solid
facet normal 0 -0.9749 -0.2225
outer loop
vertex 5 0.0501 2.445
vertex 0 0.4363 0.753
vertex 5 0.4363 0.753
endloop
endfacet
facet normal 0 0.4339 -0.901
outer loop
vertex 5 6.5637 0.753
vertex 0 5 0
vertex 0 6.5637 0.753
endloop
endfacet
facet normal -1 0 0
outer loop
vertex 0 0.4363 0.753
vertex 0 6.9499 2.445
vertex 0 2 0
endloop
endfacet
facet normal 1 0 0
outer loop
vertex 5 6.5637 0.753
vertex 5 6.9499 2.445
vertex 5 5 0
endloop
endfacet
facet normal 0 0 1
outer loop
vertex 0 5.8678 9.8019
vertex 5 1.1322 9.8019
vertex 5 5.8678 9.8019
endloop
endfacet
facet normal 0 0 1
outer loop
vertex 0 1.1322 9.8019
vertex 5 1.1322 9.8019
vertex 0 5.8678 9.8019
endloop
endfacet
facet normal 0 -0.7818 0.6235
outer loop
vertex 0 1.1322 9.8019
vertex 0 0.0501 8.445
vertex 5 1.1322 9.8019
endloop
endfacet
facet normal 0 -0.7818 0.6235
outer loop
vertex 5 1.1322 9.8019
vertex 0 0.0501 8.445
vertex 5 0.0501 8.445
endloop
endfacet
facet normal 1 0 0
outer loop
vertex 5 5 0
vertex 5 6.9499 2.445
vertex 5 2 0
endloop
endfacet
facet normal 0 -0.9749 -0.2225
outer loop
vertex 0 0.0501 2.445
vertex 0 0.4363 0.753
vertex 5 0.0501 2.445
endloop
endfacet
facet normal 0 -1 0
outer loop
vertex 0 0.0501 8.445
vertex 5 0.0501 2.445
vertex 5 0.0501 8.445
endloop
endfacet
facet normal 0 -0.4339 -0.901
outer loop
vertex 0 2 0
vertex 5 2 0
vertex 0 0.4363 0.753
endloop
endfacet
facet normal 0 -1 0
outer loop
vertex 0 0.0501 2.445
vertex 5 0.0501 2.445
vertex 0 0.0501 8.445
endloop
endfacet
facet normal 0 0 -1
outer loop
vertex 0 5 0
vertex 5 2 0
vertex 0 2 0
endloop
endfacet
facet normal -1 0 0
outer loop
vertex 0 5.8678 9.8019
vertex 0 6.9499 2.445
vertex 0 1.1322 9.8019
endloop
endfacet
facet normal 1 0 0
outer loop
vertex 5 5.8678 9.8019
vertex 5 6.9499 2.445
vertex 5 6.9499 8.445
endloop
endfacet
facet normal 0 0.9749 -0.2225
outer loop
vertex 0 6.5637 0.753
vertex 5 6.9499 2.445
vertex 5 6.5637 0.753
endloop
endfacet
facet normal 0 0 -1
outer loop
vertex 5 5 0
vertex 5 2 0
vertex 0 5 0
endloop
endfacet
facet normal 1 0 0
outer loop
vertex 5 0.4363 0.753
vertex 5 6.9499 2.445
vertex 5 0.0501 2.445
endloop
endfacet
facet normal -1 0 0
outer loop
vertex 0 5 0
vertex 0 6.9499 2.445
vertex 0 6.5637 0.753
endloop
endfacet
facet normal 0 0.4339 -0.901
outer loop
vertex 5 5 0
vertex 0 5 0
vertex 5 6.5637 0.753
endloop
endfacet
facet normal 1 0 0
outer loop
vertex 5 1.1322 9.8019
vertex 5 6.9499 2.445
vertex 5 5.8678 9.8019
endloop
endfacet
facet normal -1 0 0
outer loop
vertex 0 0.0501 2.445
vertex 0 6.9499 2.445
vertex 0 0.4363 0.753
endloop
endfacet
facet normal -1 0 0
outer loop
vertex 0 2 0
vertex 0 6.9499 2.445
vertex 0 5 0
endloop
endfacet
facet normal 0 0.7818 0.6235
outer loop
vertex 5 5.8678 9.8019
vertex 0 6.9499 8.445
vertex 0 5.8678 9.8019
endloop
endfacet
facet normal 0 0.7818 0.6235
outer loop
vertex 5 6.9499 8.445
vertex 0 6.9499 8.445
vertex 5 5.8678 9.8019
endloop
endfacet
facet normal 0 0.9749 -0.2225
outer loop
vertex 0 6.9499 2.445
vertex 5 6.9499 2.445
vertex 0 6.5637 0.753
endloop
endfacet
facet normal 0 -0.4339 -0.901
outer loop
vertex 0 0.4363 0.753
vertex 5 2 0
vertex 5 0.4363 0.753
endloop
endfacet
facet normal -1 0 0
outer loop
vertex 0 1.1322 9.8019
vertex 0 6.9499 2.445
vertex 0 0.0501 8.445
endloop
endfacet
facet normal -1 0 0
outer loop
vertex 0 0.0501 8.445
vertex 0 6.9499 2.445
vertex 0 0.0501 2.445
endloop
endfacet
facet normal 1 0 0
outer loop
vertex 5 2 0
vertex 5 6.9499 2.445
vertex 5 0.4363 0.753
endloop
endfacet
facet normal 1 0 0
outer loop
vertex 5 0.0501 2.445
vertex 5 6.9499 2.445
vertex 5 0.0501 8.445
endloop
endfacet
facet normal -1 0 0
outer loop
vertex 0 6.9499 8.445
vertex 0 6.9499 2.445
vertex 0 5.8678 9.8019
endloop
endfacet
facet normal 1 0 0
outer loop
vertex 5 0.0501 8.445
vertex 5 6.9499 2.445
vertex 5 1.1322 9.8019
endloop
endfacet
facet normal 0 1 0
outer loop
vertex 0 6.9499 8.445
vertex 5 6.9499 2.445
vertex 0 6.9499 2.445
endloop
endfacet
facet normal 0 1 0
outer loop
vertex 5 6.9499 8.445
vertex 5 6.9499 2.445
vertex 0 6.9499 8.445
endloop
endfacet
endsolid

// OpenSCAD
module cube2(size, center = false, center_xy = false, center_x = false, center_y = false, center_z = false) {
  translate([(center || center_x || center_xy ? -size[0]/2 : 0), (center || center_y || center_xy ? -size[1]/2 : 0), (center || center_z ? -size[2]/2 : 0)]) cube(size);
}
/*!cube2([5, 7, 10]);*/
/*!cube2([5, 7, 10], center_x = true, center_y = false, center_z = true);*/
/*!cube2([5, 7, 10], center = true);*/

module cube_rounded_corners(size, corner_radius, center = false, center_xy = false, center_x = false, center_y = false, center_z = false) {
  base_size = [ for (c = size) c - 2 * corner_radius ];
  /*for (c = base_size) assert(c > 0); // XXX need 2017 openscad*/ 
  translate([(center || center_x || center_xy ? -size[0]/2 : 0) + corner_radius, (center || center_y || center_xy ? -size[1]/2 : 0) + corner_radius, (center || center_z ? -size[2]/2 : 0) + corner_radius]) minkowski() {
    cube(base_size);
    sphere(r=corner_radius);
  }
}
/*!cube_rounded_corners([5, 7, 10], corner_radius = 2, center_x = true, center_y = false, center_z = true);*/
/*!cube_rounded_corners([5, 7, 10], corner_radius = 2, center = true);*/

module cube_rounded_top_corners(size, corner_radius, center = false, center_xy = false, center_x = false, center_y = false, center_z = false) {
    intersection() {
        translate([0, 0, -corner_radius]) cube_rounded_corners([size[0], size[1], size[2] + corner_radius], corner_radius, center, center_xy, center_x, center_y, center_z);
        cube2(size, center, center_xy, center_x, center_y, center_z);
    }
}

module cube_rounded_vertical_edges(size, corner_radius, center_xy = false, center = false, center_x = false, center_y = false, center_z = false) {
  base_size = [ size[0] - 2 * corner_radius, size[1] - 2 * corner_radius, size[2] - 0.1 ];
  /*for (c = base_size) assert(c > 0); // XXX need 2017 openscad*/ 
  translate([(center || center_x || center_xy ? -size[0]/2 : 0) + corner_radius, (center || center_y || center_xy ? -size[1]/2 : 0) + corner_radius, (center || center_z ? -size[2]/2 : 0)]) minkowski() {
    cube(base_size);
    cylinder(r=corner_radius, h=0.1);
  }
}
module cube_rounded_z_edges(size, corner_radius, center_xy = false, center = false, center_x = false, center_y = false, center_z = false) { cube_rounded_vertical_edges(size, corner_radius, center_xy, center, center_x, center_y, center_z); }
/*!cube_rounded_z_edges([5, 7, 10], 2);*/
/*!cube_rounded_vertical_edges([5, 7, 10], 2);*/
/*!cube_rounded_vertical_edges([5, 7, 10], corner_radius = 2, center_x = true, center_y = false, center_z = true);*/
/*!cube_rounded_vertical_edges([5, 7, 10], corner_radius = 2, center = true);*/

module cube_rounded_x_edges(size, corner_radius, center_xy = false, center = false, center_x = false, center_y = false, center_z = false) {
  base_size = [ size[0] - 0.1, size[1] - 2 * corner_radius, size[2] - 2 * corner_radius];
  /*for (c = base_size) assert(c > 0); // XXX need 2017 openscad*/ 
  translate([(center || center_x || center_xy ? -size[0]/2 : 0), (center || center_y || center_xy ? -size[1]/2 : 0) + corner_radius, (center || center_z ? -size[2]/2 : 0) + corner_radius]) minkowski() {
    cube(base_size);
    rotate([0, 90, 0]) cylinder(r=corner_radius, h=0.1);
  }
}
!cube_rounded_x_edges([5, 7, 10], 2);
/*!cube_rounded_x_edges([5, 7, 10], corner_radius = 2, center_x = true, center_y = false, center_z = true);*/
/*!cube_rounded_x_edges([5, 7, 10], corner_radius = 2, center = true);*/

module cube_rounded_y_edges(size, corner_radius, center_xy = false, center = false, center_x = false, center_y = false, center_z = false) {
  base_size = [ size[0] - 2 * corner_radius, size[1] - 0.1, size[2] - 2 * corner_radius];
  /*for (c = base_size) assert(c > 0); // XXX need 2017 openscad*/ 
  translate([(center || center_x || center_xy ? -size[0]/2 : 0) + corner_radius, (center || center_y || center_xy ? -size[1]/2 : 0), (center || center_z ? -size[2]/2 : 0) + corner_radius]) minkowski() {
    cube(base_size);
    rotate([90, 0, 0]) cylinder(r=corner_radius, h=0.1);
  }
}
/*!cube_rounded_y_edges([5, 7, 10], 2);*/
/*!cube_rounded_y_edges([5, 7, 10], corner_radius = 2, center_x = true, center_y = false, center_z = true);*/
/*!cube_rounded_y_edges([5, 7, 10], corner_radius = 2, center = true);*/
